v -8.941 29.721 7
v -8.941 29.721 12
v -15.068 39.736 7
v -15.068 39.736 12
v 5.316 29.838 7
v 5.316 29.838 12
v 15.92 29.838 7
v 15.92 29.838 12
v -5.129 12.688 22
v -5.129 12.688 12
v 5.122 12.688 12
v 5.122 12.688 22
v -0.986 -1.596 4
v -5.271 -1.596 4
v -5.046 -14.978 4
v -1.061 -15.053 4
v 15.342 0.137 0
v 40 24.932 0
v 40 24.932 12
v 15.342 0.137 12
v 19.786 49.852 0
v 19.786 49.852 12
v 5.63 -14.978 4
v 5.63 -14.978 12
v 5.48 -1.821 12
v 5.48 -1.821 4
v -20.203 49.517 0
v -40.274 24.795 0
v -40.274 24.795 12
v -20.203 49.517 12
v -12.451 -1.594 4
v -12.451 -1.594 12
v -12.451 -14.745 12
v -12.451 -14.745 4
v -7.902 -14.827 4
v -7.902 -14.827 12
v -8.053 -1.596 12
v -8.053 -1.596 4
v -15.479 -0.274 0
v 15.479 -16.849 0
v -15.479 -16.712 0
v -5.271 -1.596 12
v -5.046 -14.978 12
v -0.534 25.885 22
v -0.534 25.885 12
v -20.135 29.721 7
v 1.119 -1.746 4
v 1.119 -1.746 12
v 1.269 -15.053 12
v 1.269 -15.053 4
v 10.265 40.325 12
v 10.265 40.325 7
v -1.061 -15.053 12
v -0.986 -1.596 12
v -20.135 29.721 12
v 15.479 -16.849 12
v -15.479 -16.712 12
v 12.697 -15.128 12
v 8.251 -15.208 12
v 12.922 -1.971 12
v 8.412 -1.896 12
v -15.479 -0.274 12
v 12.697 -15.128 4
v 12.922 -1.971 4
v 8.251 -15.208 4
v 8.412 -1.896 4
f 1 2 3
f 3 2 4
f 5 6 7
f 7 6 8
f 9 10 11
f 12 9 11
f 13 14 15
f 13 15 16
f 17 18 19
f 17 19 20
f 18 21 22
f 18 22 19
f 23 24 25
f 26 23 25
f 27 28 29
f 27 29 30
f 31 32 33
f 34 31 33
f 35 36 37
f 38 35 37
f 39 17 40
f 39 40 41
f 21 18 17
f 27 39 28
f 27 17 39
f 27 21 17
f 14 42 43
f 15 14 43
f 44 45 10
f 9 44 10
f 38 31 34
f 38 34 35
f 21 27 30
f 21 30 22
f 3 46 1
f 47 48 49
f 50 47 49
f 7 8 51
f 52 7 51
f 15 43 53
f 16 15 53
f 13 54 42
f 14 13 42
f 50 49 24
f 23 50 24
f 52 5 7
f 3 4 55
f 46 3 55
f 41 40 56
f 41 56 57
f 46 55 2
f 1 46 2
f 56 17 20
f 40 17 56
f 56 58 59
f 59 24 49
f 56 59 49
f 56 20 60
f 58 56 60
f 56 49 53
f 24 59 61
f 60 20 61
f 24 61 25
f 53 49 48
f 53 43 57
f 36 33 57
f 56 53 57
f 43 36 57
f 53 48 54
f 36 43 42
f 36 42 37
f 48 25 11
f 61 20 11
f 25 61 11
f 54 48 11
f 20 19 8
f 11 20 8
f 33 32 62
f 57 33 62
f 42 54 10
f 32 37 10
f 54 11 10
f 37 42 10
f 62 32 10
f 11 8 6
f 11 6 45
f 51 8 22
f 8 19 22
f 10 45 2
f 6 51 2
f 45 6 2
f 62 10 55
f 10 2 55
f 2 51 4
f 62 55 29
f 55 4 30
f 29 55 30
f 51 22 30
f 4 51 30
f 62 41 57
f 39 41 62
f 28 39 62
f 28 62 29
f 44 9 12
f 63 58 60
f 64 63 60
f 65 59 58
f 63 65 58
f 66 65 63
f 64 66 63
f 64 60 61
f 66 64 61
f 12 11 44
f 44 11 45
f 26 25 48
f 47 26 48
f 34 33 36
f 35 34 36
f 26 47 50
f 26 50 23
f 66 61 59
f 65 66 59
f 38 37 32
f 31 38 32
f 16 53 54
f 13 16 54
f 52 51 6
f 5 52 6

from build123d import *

# Parameters (mm, degrees)
PAD_DEPTH       = 12
POCKET_DEPTH    = 8
POCKET001_DEPTH = 5
PAD001_DEPTH    = 10


with BuildPart() as part:
    # Sketch → Pad (new body)
    with BuildSketch(Plane.XY):
        Polygon((-20.202843, 49.516998), (19.785545, 49.851631), (40, 24.931509), (15.342466, 0.136983), (15.479449, -16.849316), (-15.47945, -16.712328), (-15.47945, -0.273973), (-40.273968, 24.794519), align=None)
    extrude(amount=PAD_DEPTH)

    # Sketch001 (on Face10 of Pad) → Pocket (cut)
    with BuildSketch(Plane.XY.offset(12)):
        Polygon((-12.451404, -1.594348), (-12.451404, -14.745031), (-7.902479, -14.827168), (-8.052838, -1.595545), align=None)
        Polygon((-5.271187, -1.595545), (-5.045653, -14.977527), (-1.061123, -15.052706), (-0.985945, -1.595545), align=None)
        Polygon((1.119081, -1.745904), (1.269447, -15.052706), (5.629864, -14.977527), (5.479505, -1.821082), align=None)
        Polygon((8.411511, -1.896264), (8.250714, -15.208426), (12.696754, -15.127886), (12.922295, -1.971442), align=None)
    extrude(amount=-POCKET_DEPTH, mode=Mode.SUBTRACT)

    # Sketch002 (on Face5 of Pocket) → Pocket001 (cut)
    with BuildSketch(Plane.XY.offset(12)):
        Polygon((-15.068119, 39.735771), (-20.134657, 29.72053), (-8.941154, 29.72053), align=None)
        Polygon((5.315833, 29.83836), (15.920202, 29.83836), (10.264536, 40.324898), align=None)
    extrude(amount=-POCKET001_DEPTH, mode=Mode.SUBTRACT)

    # Sketch003 (on Face5 of Pocket001) → Pad001 (join)
    with BuildSketch(Plane.XY.offset(12)):
        Polygon((-0.533761, 25.884949), (-5.129053, 12.688408), (5.121835, 12.688408), align=None)
    extrude(amount=PAD001_DEPTH)


solid = part.part
